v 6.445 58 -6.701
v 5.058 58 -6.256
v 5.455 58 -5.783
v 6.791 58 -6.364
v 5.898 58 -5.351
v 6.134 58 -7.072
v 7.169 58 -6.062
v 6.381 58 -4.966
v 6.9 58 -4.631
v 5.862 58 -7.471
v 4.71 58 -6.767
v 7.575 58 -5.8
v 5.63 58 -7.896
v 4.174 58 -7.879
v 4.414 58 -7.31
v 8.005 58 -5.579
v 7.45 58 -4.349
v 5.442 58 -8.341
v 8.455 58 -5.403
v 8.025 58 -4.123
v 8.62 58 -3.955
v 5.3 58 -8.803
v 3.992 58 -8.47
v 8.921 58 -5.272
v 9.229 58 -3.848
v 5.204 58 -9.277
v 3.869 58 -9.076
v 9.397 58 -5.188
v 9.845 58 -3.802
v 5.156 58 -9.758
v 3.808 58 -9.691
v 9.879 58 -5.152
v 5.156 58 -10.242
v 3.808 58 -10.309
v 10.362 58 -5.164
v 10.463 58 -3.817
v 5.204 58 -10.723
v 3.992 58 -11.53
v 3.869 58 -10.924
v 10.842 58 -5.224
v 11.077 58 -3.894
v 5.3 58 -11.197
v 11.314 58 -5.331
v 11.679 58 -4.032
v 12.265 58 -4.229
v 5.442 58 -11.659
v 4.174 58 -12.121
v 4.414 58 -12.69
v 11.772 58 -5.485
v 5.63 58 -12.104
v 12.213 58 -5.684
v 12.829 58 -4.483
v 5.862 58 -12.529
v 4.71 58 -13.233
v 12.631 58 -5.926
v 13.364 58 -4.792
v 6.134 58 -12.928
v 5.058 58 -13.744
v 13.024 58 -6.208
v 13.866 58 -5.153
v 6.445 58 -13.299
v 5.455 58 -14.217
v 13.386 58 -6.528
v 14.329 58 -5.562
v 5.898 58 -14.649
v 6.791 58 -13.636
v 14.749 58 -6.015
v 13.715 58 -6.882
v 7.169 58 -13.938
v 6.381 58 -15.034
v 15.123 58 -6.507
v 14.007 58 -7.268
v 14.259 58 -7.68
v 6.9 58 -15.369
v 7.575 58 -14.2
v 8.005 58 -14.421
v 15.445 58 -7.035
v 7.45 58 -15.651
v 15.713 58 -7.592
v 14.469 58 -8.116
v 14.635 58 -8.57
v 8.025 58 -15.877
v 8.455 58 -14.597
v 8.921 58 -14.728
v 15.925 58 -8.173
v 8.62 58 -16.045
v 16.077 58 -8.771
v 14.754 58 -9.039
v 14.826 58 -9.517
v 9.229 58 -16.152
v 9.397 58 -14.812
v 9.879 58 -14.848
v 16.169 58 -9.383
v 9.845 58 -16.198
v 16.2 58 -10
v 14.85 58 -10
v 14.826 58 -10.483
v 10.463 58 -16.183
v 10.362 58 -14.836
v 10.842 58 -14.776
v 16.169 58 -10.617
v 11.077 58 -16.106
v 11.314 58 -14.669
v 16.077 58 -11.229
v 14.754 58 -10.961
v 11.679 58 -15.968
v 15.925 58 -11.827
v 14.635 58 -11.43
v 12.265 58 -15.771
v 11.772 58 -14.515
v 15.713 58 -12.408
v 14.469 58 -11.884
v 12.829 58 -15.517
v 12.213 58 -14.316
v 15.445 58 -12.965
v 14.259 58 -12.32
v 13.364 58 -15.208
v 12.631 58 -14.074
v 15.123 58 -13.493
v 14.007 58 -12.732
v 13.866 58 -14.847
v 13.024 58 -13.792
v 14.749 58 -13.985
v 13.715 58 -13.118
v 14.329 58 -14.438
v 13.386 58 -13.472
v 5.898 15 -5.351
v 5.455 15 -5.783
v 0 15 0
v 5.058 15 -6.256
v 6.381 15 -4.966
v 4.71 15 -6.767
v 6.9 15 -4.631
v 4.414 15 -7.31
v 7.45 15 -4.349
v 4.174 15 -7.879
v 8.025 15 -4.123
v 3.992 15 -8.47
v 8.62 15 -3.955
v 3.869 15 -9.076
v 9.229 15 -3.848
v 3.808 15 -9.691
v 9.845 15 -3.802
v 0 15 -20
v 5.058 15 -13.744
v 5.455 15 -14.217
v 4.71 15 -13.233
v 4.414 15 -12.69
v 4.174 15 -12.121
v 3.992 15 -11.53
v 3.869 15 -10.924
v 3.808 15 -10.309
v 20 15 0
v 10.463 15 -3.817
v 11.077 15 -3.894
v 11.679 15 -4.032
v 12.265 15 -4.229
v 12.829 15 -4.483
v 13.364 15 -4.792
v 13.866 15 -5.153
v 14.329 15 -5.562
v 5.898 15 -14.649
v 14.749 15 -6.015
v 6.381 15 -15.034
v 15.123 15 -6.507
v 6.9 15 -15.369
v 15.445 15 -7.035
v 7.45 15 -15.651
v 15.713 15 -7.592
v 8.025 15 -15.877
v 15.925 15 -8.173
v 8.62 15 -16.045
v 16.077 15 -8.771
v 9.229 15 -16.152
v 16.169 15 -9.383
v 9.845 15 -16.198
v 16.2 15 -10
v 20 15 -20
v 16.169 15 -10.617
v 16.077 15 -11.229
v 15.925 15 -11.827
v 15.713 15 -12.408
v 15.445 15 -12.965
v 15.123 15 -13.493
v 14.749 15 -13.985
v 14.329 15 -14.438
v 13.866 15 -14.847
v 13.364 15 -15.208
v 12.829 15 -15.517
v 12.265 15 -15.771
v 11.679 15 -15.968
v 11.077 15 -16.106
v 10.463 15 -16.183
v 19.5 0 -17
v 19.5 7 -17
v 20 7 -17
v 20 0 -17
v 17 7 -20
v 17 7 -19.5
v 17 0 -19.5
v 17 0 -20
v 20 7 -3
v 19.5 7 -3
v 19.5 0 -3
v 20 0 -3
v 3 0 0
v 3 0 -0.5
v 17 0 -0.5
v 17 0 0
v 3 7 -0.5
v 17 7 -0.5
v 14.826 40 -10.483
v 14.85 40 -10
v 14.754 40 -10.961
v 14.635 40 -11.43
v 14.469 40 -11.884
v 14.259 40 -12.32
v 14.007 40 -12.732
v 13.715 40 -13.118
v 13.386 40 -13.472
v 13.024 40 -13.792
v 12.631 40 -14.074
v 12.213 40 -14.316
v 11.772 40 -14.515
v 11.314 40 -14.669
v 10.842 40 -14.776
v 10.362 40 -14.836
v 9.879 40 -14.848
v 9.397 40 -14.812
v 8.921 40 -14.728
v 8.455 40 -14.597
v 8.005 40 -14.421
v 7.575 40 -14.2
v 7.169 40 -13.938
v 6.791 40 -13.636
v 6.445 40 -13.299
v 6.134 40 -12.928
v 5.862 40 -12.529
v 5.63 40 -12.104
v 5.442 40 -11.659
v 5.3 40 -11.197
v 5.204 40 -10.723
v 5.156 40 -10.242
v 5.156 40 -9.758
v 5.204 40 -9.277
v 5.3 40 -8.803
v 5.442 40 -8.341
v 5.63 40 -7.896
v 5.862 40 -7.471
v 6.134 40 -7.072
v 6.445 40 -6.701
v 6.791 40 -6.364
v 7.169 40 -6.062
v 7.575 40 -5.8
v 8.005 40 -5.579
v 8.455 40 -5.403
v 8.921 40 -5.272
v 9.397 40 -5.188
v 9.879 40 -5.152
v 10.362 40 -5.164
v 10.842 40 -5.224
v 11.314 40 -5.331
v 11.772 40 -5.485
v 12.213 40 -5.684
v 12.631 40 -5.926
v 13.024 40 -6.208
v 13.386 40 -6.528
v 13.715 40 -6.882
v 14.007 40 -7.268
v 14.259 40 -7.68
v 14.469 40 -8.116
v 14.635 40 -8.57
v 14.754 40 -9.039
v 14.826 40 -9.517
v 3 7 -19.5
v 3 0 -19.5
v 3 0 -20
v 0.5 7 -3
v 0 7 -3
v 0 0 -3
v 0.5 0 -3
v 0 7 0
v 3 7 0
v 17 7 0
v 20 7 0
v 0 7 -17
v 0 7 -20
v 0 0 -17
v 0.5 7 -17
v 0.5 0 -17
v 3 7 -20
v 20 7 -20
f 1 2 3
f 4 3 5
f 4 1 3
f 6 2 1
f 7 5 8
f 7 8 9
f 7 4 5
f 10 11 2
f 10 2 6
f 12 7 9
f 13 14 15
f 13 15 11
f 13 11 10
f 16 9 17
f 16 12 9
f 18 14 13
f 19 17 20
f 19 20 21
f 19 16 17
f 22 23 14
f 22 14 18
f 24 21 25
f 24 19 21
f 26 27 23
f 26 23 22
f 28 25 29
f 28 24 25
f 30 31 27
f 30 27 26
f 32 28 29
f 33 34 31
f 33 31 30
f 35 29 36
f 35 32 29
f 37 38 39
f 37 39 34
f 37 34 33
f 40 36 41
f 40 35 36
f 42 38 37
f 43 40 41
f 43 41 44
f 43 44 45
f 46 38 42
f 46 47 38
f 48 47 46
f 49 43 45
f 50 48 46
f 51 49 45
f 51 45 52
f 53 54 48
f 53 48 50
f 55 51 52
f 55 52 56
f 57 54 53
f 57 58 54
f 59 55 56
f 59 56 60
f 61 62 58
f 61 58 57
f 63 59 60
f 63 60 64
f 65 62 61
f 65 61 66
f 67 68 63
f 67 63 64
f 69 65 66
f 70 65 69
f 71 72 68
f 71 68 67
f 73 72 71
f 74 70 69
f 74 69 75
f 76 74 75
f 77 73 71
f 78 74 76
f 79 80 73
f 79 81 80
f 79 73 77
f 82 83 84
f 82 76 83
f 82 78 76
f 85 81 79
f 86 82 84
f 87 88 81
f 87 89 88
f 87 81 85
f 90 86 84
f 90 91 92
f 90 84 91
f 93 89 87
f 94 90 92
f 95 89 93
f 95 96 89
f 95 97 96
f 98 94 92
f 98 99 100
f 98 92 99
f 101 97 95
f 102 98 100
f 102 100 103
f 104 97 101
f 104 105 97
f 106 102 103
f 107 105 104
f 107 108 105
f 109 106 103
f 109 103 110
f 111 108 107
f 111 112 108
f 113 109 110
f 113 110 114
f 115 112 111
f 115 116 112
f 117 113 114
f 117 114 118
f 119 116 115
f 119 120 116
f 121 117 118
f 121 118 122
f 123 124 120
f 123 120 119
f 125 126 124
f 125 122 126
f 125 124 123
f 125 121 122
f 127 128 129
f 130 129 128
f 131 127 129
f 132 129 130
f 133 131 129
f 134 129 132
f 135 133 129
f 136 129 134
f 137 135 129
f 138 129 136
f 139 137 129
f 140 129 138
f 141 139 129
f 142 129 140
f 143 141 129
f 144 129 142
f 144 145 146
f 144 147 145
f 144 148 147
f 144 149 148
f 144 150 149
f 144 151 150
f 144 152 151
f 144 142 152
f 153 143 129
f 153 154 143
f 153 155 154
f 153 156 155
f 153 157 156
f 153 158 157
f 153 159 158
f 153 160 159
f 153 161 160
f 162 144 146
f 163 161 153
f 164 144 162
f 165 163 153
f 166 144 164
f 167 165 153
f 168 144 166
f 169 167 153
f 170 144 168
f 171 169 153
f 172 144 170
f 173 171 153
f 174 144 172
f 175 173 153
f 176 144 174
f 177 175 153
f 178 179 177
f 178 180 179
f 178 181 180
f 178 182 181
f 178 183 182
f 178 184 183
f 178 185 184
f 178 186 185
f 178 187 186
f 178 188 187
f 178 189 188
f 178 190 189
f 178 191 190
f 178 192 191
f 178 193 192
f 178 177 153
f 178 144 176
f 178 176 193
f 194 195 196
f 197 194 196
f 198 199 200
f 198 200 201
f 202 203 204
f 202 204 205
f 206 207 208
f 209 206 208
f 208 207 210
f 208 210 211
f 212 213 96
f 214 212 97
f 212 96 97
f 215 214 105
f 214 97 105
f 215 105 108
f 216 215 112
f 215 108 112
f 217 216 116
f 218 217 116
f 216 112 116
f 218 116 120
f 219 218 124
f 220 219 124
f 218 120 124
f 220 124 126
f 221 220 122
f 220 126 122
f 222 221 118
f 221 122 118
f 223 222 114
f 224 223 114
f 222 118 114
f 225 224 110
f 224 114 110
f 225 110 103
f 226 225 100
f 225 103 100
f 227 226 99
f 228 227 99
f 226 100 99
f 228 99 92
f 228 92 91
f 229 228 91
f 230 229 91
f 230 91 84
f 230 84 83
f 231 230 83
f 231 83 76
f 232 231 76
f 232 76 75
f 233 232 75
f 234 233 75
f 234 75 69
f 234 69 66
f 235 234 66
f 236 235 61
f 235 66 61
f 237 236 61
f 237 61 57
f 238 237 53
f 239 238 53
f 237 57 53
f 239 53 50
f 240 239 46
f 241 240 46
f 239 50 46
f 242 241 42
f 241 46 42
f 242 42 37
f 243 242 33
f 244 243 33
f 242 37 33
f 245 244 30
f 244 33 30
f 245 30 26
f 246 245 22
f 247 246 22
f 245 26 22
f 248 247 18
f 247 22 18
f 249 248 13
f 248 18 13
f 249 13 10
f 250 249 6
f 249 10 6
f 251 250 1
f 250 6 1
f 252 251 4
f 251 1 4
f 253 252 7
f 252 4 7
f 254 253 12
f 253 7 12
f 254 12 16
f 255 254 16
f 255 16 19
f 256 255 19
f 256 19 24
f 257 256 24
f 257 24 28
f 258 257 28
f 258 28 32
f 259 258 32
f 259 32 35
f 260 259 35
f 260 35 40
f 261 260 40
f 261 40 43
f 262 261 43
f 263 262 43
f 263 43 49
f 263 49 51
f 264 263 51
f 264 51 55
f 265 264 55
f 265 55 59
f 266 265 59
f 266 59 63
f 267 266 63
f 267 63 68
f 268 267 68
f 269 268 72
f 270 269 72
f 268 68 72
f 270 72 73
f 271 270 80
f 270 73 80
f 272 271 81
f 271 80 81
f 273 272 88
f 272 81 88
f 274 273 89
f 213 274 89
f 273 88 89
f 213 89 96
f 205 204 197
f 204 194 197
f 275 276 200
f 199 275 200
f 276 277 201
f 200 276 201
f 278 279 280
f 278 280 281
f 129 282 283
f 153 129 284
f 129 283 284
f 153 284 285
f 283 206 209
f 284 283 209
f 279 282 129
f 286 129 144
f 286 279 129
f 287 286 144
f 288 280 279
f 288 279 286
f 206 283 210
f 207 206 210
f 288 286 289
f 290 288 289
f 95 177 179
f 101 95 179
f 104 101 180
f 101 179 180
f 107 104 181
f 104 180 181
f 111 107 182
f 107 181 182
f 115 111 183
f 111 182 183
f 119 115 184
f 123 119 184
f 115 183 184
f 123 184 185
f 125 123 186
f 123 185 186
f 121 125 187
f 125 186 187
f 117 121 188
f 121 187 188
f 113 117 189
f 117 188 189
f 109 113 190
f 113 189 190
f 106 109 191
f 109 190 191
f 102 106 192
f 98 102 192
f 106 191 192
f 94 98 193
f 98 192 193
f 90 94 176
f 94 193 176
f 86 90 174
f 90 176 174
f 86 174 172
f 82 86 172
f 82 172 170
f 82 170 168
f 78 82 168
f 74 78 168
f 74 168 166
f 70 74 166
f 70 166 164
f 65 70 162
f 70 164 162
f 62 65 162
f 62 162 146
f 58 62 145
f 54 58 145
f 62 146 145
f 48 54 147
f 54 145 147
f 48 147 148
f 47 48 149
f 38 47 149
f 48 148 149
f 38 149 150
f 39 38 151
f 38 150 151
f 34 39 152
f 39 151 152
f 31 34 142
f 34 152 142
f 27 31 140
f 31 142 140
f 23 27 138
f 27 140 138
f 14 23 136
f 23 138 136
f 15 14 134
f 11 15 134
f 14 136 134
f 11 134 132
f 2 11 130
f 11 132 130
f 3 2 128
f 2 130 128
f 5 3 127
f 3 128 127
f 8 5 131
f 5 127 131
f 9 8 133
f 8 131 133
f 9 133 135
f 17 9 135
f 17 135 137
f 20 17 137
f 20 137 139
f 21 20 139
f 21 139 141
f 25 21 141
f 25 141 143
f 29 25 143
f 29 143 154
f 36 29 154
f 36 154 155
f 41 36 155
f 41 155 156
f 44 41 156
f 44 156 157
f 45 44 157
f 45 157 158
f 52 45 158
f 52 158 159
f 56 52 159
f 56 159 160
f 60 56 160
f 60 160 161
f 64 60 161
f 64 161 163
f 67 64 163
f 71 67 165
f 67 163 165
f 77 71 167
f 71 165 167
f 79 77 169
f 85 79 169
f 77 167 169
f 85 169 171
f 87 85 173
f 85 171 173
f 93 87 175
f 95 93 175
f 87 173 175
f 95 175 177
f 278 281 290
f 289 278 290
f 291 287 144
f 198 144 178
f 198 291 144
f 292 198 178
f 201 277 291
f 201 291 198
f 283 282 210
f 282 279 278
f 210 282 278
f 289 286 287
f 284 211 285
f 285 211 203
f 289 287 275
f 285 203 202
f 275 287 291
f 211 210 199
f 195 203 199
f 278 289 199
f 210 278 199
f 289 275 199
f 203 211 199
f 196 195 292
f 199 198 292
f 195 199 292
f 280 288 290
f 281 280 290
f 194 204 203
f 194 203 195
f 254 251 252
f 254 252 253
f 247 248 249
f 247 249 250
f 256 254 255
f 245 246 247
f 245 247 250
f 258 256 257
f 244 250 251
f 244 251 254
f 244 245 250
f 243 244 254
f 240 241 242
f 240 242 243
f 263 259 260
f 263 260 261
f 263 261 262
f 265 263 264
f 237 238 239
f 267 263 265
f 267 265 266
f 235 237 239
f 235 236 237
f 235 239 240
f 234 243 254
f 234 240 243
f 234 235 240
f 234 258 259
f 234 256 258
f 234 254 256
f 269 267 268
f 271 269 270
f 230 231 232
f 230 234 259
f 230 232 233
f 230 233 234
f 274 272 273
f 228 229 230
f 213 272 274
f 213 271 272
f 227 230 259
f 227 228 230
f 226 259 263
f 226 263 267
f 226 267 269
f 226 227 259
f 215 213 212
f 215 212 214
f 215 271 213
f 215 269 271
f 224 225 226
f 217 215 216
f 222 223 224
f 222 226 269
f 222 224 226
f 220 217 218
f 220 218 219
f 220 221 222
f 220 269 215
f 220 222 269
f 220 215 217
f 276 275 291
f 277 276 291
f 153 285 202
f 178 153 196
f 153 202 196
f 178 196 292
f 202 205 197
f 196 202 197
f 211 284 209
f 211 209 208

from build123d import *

# Parameters (mm, degrees)
SKETCH_1_W          = 20
SKETCH_1_H          = 20
SKETCH_1_W_2        = 19
SKETCH_1_H_2        = 19
EXTRUDE_1_DEPTH     = 7
SKETCH_3_W          = 20
SKETCH_3_H          = 20
EXTRUDE_2_DEPTH     = 8
SKETCH_4_R          = 6.2
EXTRUDE_3_DEPTH     = 43
SKETCH_5_R          = 4.85
CUT_EXTRUDE_1_DEPTH = 18
SKETCH_6_W          = 3
SKETCH_6_H          = 3
CUT_EXTRUDE_2_DEPTH = 10


with BuildPart() as part:
    # 草圖1 → 填料-伸長1 (new body)
    with BuildSketch(Plane(origin=(0, 0, 0), x_dir=(1, 0, 0), z_dir=(0, 1, 0))):
        with Locations((10, 10)):
            Rectangle(SKETCH_1_W, SKETCH_1_H)
        with Locations((10, 10)):
            Rectangle(SKETCH_1_W_2, SKETCH_1_H_2, mode=Mode.SUBTRACT)
    extrude(amount=EXTRUDE_1_DEPTH)

    # 草圖3 → 填料-伸長2 (add)
    with BuildSketch(Plane(origin=(0, 7, 0), x_dir=(1, 0, 0), z_dir=(0, 1, 0))):
        with Locations((10, 10)):
            Rectangle(SKETCH_3_W, SKETCH_3_H)
    extrude(amount=EXTRUDE_2_DEPTH)

    # 草圖4 → 填料-伸長3 (add)
    with BuildSketch(Plane(origin=(0, 15, 0), x_dir=(1, 0, 0), z_dir=(0, 1, 0))):
        with Locations((10, 10)):
            Circle(SKETCH_4_R)
    extrude(amount=EXTRUDE_3_DEPTH)

    # 草圖5 → 除料-伸長1 (cut)
    with BuildSketch(Plane(origin=(0, 58, 0), x_dir=(1, 0, 0), z_dir=(0, 1, 0))):
        with Locations((10, 10)):
            Circle(SKETCH_5_R)
    extrude(amount=-CUT_EXTRUDE_1_DEPTH, mode=Mode.SUBTRACT)

    # 草圖6 → 除料-伸長2 (cut)
    with BuildSketch(Plane(origin=(0, 7, 0), x_dir=(1, 0, 0), z_dir=(0, 1, 0))):
        with Locations((1.5, 18.5)):
            Rectangle(SKETCH_6_W, SKETCH_6_H)
        with Locations((18.5, 1.5)):
            Rectangle(SKETCH_6_W, SKETCH_6_H)
        with Locations((18.5, 18.5)):
            Rectangle(SKETCH_6_W, SKETCH_6_H)
        with Locations((1.5, 1.5)):
            Rectangle(SKETCH_6_W, SKETCH_6_H)
    extrude(amount=-CUT_EXTRUDE_2_DEPTH, mode=Mode.SUBTRACT)


solid = part.part
